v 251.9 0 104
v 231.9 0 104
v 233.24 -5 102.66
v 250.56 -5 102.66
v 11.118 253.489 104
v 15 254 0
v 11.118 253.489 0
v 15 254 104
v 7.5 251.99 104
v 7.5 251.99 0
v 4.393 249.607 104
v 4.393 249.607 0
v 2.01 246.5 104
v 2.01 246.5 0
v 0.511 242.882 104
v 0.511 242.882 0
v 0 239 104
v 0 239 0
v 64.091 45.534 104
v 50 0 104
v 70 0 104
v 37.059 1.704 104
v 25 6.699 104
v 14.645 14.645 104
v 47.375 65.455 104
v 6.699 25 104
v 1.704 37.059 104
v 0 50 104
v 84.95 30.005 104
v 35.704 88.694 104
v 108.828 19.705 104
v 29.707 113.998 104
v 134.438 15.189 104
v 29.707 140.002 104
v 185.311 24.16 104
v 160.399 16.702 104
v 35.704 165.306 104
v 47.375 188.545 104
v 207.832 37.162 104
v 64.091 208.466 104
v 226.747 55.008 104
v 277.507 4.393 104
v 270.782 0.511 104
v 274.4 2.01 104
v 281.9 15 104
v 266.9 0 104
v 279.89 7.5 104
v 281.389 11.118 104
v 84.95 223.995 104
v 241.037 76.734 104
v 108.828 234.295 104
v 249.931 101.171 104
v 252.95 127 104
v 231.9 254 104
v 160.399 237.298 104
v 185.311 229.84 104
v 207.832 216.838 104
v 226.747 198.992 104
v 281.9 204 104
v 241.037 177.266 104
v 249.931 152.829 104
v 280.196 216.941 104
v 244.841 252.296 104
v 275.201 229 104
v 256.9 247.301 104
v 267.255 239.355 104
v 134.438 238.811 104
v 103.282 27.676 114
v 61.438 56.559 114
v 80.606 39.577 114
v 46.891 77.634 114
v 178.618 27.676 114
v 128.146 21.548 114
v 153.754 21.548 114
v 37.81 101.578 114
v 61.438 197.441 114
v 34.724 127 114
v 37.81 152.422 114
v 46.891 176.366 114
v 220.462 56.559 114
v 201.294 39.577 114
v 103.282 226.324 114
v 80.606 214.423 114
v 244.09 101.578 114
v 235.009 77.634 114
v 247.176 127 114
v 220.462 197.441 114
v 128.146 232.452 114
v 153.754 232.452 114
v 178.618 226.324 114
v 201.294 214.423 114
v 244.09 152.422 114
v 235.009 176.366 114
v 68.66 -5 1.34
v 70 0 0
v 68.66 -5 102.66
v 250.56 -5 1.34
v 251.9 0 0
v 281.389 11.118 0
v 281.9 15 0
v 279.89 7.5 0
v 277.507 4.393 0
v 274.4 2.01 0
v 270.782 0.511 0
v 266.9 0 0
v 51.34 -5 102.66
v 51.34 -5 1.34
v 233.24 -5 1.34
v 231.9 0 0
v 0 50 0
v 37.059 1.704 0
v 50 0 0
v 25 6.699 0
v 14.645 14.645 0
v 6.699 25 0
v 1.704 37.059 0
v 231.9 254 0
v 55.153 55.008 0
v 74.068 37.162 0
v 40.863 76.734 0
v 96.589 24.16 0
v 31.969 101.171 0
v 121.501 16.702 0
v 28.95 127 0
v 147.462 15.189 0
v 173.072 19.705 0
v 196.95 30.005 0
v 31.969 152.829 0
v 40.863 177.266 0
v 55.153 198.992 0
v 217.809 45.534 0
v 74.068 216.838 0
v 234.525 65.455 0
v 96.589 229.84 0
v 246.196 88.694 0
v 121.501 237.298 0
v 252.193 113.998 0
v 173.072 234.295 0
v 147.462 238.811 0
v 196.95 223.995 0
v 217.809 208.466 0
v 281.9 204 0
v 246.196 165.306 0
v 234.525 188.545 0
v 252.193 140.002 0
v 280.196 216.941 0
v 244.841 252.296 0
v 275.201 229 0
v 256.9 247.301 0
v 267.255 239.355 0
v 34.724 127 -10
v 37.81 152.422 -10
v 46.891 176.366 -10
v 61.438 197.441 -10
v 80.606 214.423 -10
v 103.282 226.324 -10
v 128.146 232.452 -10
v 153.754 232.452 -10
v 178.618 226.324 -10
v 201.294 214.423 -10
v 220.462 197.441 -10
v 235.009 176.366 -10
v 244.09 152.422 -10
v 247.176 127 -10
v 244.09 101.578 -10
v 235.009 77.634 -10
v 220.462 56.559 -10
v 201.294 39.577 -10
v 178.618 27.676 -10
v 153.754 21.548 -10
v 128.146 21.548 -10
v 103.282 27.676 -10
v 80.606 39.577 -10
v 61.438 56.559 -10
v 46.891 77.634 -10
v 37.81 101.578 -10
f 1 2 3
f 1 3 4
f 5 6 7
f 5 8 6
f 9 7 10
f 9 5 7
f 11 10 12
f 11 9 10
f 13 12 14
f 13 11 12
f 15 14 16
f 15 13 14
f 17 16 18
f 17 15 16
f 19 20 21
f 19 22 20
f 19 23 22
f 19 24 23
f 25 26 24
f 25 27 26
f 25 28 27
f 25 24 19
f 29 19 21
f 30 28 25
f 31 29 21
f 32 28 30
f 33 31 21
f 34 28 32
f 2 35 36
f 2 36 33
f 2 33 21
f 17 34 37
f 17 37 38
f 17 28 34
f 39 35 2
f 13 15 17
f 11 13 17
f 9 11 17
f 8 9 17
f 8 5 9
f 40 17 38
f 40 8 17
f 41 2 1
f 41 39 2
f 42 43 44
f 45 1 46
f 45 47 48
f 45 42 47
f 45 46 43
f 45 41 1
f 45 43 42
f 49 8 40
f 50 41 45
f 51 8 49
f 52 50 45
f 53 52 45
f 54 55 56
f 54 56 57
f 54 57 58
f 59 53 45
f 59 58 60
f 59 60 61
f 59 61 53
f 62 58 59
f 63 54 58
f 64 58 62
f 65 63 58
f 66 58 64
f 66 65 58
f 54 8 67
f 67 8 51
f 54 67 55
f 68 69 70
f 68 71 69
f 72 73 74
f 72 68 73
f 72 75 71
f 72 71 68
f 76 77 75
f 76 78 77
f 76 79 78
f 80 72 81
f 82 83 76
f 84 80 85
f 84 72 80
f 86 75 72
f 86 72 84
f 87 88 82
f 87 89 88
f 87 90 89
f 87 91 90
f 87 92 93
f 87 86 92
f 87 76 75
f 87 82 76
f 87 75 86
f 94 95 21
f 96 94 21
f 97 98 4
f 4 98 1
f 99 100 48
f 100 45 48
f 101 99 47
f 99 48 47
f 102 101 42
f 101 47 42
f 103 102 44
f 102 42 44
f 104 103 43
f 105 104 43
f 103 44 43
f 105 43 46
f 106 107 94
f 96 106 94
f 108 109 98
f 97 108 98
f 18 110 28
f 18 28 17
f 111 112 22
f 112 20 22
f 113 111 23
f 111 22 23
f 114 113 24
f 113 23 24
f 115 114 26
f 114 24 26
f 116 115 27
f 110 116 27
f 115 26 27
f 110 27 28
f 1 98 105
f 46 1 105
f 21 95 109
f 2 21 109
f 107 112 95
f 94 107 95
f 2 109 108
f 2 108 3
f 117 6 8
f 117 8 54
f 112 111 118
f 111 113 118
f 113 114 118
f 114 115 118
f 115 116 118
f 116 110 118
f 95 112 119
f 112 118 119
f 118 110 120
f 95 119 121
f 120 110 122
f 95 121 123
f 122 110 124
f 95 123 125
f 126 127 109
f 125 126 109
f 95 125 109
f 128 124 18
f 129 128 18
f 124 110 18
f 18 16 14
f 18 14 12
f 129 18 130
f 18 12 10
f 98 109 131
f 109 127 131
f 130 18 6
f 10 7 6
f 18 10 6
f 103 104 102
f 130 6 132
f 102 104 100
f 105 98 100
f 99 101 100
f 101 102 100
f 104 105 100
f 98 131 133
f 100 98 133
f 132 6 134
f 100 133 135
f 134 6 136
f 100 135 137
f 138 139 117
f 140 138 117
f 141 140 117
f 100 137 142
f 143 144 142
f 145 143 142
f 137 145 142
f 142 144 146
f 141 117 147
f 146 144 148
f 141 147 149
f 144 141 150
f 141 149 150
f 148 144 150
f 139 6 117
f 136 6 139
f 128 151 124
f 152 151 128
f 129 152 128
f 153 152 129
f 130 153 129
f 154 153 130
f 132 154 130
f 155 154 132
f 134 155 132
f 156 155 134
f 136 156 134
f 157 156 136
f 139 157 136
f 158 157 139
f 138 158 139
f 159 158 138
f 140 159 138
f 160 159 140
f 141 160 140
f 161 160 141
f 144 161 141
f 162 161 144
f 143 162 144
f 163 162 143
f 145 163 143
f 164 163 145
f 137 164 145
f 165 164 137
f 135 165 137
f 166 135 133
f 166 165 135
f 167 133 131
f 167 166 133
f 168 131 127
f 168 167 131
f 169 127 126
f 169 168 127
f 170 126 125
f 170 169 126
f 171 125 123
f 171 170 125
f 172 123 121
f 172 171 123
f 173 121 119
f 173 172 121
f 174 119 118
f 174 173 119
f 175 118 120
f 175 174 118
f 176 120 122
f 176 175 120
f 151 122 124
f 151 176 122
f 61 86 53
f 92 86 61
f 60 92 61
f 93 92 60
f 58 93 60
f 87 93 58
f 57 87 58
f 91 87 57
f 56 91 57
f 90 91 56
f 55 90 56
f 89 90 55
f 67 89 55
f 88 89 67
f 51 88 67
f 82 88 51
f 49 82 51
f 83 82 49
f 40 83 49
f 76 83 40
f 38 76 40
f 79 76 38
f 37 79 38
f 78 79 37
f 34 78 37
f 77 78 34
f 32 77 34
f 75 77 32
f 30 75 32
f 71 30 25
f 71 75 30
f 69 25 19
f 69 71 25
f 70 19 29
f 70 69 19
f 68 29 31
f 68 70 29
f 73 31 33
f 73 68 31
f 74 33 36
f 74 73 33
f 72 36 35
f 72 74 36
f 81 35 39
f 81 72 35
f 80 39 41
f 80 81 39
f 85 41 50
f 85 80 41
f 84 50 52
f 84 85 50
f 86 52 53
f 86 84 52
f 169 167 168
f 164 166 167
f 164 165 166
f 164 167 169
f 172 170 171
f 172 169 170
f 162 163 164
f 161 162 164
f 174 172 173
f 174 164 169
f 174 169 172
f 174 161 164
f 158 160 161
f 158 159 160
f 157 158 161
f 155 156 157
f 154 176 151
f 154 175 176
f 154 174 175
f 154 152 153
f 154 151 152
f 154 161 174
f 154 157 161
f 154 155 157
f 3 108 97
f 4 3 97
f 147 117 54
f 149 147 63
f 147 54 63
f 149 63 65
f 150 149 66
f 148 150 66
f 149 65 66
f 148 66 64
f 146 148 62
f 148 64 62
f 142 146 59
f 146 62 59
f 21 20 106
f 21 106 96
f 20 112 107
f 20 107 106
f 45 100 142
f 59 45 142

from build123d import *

# Parameters (mm, degrees)
SKETCH1_W                     = 281.9
SKETCH1_H                     = 254
BOSS_EXTRUDE1_DEPTH           = 104
SKETCH3_R                     = 112
BOSS_EXTRUDE3_DEPTH           = 10
BOSS_EXTRUDE3_TAPER           = 30
SKETCH5_R                     = 112
BOSS_EXTRUDE5_DEPTH           = 10
BOSS_EXTRUDE5_TAPER           = 30
FILLET5_R                     = 50
FILLET7_R                     = 15
FILLET8_R                     = 15
FILLET9_R                     = 50
SKETCH6_W                     = 20
SKETCH6_H                     = 104
BOSS_EXTRUDE7_DEPTH           = 5
BOSS_EXTRUDE7_DRAFT           = 15
BOSS_EXTRUDE7_PROFILE_2_DEPTH = 5
BOSS_EXTRUDE7_PROFILE_2_DRAFT = 15


with BuildPart() as part:
    # Sketch1 → Boss-Extrude1 (new body)
    with BuildSketch(Plane.XY):
        with Locations((140.95, 127)):
            Rectangle(SKETCH1_W, SKETCH1_H)
    extrude(amount=BOSS_EXTRUDE1_DEPTH)

    # Sketch3 → Boss-Extrude3 (add)
    with BuildSketch(Plane.XY.offset(104)):
        with Locations((140.95, 127)):
            Circle(SKETCH3_R)
    extrude(amount=BOSS_EXTRUDE3_DEPTH, taper=BOSS_EXTRUDE3_TAPER)

    # Sketch5 → Boss-Extrude5 (add)
    with BuildSketch(Plane(origin=(0, 0, 0), x_dir=(-1, 0, 0), z_dir=(0, 0, -1))):
        with Locations((-140.95, 127)):
            Circle(SKETCH5_R)
    extrude(amount=BOSS_EXTRUDE5_DEPTH, taper=BOSS_EXTRUDE5_TAPER)

    # Fillet5
    fillet5_edges = [part.edges().sort_by_distance(p)[0] for p in [
        (281.9, 254, 52),
    ]]
    fillet(fillet5_edges, radius=FILLET5_R)

    # Fillet7
    fillet7_edges = [part.edges().sort_by_distance(p)[0] for p in [
        (0, 254, 52),
    ]]
    fillet(fillet7_edges, radius=FILLET7_R)

    # Fillet8
    fillet8_edges = [part.edges().sort_by_distance(p)[0] for p in [
        (281.9, 0, 52),
    ]]
    fillet(fillet8_edges, radius=FILLET8_R)

    # Fillet9
    fillet9_edges = [part.edges().sort_by_distance(p)[0] for p in [
        (0, 0, 52),
    ]]
    fillet(fillet9_edges, radius=FILLET9_R)


with BuildPart() as boss_extrude7_tool:
    # Sketch6 → Boss-Extrude7 (with draft: the straight prism first)
    with BuildSketch(Plane.XZ):
        with Locations((241.9, 52)):
            Rectangle(SKETCH6_W, SKETCH6_H)
    extrude(amount=BOSS_EXTRUDE7_DEPTH)
    # Boss-Extrude7: the draft: its side faces are tilted about the plane it starts from
    boss_extrude7_sides = [boss_extrude7_tool.faces().sort_by_distance(p)[0] for p in [
        (241.9, -2.5, 104),
        (231.9, -2.5, 52),
        (241.9, -2.5, 0),
        (251.9, -2.5, 52),
    ]]
    draft(boss_extrude7_sides, Plane.XZ, BOSS_EXTRUDE7_DRAFT)


with BuildPart() as part_1:
    add(part.part)

    # Boss-Extrude7: add boss_extrude7_tool
    add(boss_extrude7_tool.part)


with BuildPart() as boss_extrude7_profile_2_tool:
    # Sketch6 → Boss-Extrude7 profile 2 (with draft: the straight prism first)
    with BuildSketch(Plane.XZ):
        with Locations((60, 52)):
            Rectangle(SKETCH6_W, SKETCH6_H)
    extrude(amount=BOSS_EXTRUDE7_PROFILE_2_DEPTH)
    # Boss-Extrude7 profile 2: the draft: its side faces are tilted about the plane it starts from
    boss_extrude7_profile_2_sides = [boss_extrude7_profile_2_tool.faces().sort_by_distance(p)[0] for p in [
        (50, -2.5, 52),
        (60, -2.5, 0),
        (70, -2.5, 52),
        (60, -2.5, 104),
    ]]
    draft(boss_extrude7_profile_2_sides, Plane.XZ, BOSS_EXTRUDE7_PROFILE_2_DRAFT)


with BuildPart() as part_2:
    add(part_1.part)

    # Boss-Extrude7 profile 2: add boss_extrude7_profile_2_tool
    add(boss_extrude7_profile_2_tool.part)


solid = part_2.part
